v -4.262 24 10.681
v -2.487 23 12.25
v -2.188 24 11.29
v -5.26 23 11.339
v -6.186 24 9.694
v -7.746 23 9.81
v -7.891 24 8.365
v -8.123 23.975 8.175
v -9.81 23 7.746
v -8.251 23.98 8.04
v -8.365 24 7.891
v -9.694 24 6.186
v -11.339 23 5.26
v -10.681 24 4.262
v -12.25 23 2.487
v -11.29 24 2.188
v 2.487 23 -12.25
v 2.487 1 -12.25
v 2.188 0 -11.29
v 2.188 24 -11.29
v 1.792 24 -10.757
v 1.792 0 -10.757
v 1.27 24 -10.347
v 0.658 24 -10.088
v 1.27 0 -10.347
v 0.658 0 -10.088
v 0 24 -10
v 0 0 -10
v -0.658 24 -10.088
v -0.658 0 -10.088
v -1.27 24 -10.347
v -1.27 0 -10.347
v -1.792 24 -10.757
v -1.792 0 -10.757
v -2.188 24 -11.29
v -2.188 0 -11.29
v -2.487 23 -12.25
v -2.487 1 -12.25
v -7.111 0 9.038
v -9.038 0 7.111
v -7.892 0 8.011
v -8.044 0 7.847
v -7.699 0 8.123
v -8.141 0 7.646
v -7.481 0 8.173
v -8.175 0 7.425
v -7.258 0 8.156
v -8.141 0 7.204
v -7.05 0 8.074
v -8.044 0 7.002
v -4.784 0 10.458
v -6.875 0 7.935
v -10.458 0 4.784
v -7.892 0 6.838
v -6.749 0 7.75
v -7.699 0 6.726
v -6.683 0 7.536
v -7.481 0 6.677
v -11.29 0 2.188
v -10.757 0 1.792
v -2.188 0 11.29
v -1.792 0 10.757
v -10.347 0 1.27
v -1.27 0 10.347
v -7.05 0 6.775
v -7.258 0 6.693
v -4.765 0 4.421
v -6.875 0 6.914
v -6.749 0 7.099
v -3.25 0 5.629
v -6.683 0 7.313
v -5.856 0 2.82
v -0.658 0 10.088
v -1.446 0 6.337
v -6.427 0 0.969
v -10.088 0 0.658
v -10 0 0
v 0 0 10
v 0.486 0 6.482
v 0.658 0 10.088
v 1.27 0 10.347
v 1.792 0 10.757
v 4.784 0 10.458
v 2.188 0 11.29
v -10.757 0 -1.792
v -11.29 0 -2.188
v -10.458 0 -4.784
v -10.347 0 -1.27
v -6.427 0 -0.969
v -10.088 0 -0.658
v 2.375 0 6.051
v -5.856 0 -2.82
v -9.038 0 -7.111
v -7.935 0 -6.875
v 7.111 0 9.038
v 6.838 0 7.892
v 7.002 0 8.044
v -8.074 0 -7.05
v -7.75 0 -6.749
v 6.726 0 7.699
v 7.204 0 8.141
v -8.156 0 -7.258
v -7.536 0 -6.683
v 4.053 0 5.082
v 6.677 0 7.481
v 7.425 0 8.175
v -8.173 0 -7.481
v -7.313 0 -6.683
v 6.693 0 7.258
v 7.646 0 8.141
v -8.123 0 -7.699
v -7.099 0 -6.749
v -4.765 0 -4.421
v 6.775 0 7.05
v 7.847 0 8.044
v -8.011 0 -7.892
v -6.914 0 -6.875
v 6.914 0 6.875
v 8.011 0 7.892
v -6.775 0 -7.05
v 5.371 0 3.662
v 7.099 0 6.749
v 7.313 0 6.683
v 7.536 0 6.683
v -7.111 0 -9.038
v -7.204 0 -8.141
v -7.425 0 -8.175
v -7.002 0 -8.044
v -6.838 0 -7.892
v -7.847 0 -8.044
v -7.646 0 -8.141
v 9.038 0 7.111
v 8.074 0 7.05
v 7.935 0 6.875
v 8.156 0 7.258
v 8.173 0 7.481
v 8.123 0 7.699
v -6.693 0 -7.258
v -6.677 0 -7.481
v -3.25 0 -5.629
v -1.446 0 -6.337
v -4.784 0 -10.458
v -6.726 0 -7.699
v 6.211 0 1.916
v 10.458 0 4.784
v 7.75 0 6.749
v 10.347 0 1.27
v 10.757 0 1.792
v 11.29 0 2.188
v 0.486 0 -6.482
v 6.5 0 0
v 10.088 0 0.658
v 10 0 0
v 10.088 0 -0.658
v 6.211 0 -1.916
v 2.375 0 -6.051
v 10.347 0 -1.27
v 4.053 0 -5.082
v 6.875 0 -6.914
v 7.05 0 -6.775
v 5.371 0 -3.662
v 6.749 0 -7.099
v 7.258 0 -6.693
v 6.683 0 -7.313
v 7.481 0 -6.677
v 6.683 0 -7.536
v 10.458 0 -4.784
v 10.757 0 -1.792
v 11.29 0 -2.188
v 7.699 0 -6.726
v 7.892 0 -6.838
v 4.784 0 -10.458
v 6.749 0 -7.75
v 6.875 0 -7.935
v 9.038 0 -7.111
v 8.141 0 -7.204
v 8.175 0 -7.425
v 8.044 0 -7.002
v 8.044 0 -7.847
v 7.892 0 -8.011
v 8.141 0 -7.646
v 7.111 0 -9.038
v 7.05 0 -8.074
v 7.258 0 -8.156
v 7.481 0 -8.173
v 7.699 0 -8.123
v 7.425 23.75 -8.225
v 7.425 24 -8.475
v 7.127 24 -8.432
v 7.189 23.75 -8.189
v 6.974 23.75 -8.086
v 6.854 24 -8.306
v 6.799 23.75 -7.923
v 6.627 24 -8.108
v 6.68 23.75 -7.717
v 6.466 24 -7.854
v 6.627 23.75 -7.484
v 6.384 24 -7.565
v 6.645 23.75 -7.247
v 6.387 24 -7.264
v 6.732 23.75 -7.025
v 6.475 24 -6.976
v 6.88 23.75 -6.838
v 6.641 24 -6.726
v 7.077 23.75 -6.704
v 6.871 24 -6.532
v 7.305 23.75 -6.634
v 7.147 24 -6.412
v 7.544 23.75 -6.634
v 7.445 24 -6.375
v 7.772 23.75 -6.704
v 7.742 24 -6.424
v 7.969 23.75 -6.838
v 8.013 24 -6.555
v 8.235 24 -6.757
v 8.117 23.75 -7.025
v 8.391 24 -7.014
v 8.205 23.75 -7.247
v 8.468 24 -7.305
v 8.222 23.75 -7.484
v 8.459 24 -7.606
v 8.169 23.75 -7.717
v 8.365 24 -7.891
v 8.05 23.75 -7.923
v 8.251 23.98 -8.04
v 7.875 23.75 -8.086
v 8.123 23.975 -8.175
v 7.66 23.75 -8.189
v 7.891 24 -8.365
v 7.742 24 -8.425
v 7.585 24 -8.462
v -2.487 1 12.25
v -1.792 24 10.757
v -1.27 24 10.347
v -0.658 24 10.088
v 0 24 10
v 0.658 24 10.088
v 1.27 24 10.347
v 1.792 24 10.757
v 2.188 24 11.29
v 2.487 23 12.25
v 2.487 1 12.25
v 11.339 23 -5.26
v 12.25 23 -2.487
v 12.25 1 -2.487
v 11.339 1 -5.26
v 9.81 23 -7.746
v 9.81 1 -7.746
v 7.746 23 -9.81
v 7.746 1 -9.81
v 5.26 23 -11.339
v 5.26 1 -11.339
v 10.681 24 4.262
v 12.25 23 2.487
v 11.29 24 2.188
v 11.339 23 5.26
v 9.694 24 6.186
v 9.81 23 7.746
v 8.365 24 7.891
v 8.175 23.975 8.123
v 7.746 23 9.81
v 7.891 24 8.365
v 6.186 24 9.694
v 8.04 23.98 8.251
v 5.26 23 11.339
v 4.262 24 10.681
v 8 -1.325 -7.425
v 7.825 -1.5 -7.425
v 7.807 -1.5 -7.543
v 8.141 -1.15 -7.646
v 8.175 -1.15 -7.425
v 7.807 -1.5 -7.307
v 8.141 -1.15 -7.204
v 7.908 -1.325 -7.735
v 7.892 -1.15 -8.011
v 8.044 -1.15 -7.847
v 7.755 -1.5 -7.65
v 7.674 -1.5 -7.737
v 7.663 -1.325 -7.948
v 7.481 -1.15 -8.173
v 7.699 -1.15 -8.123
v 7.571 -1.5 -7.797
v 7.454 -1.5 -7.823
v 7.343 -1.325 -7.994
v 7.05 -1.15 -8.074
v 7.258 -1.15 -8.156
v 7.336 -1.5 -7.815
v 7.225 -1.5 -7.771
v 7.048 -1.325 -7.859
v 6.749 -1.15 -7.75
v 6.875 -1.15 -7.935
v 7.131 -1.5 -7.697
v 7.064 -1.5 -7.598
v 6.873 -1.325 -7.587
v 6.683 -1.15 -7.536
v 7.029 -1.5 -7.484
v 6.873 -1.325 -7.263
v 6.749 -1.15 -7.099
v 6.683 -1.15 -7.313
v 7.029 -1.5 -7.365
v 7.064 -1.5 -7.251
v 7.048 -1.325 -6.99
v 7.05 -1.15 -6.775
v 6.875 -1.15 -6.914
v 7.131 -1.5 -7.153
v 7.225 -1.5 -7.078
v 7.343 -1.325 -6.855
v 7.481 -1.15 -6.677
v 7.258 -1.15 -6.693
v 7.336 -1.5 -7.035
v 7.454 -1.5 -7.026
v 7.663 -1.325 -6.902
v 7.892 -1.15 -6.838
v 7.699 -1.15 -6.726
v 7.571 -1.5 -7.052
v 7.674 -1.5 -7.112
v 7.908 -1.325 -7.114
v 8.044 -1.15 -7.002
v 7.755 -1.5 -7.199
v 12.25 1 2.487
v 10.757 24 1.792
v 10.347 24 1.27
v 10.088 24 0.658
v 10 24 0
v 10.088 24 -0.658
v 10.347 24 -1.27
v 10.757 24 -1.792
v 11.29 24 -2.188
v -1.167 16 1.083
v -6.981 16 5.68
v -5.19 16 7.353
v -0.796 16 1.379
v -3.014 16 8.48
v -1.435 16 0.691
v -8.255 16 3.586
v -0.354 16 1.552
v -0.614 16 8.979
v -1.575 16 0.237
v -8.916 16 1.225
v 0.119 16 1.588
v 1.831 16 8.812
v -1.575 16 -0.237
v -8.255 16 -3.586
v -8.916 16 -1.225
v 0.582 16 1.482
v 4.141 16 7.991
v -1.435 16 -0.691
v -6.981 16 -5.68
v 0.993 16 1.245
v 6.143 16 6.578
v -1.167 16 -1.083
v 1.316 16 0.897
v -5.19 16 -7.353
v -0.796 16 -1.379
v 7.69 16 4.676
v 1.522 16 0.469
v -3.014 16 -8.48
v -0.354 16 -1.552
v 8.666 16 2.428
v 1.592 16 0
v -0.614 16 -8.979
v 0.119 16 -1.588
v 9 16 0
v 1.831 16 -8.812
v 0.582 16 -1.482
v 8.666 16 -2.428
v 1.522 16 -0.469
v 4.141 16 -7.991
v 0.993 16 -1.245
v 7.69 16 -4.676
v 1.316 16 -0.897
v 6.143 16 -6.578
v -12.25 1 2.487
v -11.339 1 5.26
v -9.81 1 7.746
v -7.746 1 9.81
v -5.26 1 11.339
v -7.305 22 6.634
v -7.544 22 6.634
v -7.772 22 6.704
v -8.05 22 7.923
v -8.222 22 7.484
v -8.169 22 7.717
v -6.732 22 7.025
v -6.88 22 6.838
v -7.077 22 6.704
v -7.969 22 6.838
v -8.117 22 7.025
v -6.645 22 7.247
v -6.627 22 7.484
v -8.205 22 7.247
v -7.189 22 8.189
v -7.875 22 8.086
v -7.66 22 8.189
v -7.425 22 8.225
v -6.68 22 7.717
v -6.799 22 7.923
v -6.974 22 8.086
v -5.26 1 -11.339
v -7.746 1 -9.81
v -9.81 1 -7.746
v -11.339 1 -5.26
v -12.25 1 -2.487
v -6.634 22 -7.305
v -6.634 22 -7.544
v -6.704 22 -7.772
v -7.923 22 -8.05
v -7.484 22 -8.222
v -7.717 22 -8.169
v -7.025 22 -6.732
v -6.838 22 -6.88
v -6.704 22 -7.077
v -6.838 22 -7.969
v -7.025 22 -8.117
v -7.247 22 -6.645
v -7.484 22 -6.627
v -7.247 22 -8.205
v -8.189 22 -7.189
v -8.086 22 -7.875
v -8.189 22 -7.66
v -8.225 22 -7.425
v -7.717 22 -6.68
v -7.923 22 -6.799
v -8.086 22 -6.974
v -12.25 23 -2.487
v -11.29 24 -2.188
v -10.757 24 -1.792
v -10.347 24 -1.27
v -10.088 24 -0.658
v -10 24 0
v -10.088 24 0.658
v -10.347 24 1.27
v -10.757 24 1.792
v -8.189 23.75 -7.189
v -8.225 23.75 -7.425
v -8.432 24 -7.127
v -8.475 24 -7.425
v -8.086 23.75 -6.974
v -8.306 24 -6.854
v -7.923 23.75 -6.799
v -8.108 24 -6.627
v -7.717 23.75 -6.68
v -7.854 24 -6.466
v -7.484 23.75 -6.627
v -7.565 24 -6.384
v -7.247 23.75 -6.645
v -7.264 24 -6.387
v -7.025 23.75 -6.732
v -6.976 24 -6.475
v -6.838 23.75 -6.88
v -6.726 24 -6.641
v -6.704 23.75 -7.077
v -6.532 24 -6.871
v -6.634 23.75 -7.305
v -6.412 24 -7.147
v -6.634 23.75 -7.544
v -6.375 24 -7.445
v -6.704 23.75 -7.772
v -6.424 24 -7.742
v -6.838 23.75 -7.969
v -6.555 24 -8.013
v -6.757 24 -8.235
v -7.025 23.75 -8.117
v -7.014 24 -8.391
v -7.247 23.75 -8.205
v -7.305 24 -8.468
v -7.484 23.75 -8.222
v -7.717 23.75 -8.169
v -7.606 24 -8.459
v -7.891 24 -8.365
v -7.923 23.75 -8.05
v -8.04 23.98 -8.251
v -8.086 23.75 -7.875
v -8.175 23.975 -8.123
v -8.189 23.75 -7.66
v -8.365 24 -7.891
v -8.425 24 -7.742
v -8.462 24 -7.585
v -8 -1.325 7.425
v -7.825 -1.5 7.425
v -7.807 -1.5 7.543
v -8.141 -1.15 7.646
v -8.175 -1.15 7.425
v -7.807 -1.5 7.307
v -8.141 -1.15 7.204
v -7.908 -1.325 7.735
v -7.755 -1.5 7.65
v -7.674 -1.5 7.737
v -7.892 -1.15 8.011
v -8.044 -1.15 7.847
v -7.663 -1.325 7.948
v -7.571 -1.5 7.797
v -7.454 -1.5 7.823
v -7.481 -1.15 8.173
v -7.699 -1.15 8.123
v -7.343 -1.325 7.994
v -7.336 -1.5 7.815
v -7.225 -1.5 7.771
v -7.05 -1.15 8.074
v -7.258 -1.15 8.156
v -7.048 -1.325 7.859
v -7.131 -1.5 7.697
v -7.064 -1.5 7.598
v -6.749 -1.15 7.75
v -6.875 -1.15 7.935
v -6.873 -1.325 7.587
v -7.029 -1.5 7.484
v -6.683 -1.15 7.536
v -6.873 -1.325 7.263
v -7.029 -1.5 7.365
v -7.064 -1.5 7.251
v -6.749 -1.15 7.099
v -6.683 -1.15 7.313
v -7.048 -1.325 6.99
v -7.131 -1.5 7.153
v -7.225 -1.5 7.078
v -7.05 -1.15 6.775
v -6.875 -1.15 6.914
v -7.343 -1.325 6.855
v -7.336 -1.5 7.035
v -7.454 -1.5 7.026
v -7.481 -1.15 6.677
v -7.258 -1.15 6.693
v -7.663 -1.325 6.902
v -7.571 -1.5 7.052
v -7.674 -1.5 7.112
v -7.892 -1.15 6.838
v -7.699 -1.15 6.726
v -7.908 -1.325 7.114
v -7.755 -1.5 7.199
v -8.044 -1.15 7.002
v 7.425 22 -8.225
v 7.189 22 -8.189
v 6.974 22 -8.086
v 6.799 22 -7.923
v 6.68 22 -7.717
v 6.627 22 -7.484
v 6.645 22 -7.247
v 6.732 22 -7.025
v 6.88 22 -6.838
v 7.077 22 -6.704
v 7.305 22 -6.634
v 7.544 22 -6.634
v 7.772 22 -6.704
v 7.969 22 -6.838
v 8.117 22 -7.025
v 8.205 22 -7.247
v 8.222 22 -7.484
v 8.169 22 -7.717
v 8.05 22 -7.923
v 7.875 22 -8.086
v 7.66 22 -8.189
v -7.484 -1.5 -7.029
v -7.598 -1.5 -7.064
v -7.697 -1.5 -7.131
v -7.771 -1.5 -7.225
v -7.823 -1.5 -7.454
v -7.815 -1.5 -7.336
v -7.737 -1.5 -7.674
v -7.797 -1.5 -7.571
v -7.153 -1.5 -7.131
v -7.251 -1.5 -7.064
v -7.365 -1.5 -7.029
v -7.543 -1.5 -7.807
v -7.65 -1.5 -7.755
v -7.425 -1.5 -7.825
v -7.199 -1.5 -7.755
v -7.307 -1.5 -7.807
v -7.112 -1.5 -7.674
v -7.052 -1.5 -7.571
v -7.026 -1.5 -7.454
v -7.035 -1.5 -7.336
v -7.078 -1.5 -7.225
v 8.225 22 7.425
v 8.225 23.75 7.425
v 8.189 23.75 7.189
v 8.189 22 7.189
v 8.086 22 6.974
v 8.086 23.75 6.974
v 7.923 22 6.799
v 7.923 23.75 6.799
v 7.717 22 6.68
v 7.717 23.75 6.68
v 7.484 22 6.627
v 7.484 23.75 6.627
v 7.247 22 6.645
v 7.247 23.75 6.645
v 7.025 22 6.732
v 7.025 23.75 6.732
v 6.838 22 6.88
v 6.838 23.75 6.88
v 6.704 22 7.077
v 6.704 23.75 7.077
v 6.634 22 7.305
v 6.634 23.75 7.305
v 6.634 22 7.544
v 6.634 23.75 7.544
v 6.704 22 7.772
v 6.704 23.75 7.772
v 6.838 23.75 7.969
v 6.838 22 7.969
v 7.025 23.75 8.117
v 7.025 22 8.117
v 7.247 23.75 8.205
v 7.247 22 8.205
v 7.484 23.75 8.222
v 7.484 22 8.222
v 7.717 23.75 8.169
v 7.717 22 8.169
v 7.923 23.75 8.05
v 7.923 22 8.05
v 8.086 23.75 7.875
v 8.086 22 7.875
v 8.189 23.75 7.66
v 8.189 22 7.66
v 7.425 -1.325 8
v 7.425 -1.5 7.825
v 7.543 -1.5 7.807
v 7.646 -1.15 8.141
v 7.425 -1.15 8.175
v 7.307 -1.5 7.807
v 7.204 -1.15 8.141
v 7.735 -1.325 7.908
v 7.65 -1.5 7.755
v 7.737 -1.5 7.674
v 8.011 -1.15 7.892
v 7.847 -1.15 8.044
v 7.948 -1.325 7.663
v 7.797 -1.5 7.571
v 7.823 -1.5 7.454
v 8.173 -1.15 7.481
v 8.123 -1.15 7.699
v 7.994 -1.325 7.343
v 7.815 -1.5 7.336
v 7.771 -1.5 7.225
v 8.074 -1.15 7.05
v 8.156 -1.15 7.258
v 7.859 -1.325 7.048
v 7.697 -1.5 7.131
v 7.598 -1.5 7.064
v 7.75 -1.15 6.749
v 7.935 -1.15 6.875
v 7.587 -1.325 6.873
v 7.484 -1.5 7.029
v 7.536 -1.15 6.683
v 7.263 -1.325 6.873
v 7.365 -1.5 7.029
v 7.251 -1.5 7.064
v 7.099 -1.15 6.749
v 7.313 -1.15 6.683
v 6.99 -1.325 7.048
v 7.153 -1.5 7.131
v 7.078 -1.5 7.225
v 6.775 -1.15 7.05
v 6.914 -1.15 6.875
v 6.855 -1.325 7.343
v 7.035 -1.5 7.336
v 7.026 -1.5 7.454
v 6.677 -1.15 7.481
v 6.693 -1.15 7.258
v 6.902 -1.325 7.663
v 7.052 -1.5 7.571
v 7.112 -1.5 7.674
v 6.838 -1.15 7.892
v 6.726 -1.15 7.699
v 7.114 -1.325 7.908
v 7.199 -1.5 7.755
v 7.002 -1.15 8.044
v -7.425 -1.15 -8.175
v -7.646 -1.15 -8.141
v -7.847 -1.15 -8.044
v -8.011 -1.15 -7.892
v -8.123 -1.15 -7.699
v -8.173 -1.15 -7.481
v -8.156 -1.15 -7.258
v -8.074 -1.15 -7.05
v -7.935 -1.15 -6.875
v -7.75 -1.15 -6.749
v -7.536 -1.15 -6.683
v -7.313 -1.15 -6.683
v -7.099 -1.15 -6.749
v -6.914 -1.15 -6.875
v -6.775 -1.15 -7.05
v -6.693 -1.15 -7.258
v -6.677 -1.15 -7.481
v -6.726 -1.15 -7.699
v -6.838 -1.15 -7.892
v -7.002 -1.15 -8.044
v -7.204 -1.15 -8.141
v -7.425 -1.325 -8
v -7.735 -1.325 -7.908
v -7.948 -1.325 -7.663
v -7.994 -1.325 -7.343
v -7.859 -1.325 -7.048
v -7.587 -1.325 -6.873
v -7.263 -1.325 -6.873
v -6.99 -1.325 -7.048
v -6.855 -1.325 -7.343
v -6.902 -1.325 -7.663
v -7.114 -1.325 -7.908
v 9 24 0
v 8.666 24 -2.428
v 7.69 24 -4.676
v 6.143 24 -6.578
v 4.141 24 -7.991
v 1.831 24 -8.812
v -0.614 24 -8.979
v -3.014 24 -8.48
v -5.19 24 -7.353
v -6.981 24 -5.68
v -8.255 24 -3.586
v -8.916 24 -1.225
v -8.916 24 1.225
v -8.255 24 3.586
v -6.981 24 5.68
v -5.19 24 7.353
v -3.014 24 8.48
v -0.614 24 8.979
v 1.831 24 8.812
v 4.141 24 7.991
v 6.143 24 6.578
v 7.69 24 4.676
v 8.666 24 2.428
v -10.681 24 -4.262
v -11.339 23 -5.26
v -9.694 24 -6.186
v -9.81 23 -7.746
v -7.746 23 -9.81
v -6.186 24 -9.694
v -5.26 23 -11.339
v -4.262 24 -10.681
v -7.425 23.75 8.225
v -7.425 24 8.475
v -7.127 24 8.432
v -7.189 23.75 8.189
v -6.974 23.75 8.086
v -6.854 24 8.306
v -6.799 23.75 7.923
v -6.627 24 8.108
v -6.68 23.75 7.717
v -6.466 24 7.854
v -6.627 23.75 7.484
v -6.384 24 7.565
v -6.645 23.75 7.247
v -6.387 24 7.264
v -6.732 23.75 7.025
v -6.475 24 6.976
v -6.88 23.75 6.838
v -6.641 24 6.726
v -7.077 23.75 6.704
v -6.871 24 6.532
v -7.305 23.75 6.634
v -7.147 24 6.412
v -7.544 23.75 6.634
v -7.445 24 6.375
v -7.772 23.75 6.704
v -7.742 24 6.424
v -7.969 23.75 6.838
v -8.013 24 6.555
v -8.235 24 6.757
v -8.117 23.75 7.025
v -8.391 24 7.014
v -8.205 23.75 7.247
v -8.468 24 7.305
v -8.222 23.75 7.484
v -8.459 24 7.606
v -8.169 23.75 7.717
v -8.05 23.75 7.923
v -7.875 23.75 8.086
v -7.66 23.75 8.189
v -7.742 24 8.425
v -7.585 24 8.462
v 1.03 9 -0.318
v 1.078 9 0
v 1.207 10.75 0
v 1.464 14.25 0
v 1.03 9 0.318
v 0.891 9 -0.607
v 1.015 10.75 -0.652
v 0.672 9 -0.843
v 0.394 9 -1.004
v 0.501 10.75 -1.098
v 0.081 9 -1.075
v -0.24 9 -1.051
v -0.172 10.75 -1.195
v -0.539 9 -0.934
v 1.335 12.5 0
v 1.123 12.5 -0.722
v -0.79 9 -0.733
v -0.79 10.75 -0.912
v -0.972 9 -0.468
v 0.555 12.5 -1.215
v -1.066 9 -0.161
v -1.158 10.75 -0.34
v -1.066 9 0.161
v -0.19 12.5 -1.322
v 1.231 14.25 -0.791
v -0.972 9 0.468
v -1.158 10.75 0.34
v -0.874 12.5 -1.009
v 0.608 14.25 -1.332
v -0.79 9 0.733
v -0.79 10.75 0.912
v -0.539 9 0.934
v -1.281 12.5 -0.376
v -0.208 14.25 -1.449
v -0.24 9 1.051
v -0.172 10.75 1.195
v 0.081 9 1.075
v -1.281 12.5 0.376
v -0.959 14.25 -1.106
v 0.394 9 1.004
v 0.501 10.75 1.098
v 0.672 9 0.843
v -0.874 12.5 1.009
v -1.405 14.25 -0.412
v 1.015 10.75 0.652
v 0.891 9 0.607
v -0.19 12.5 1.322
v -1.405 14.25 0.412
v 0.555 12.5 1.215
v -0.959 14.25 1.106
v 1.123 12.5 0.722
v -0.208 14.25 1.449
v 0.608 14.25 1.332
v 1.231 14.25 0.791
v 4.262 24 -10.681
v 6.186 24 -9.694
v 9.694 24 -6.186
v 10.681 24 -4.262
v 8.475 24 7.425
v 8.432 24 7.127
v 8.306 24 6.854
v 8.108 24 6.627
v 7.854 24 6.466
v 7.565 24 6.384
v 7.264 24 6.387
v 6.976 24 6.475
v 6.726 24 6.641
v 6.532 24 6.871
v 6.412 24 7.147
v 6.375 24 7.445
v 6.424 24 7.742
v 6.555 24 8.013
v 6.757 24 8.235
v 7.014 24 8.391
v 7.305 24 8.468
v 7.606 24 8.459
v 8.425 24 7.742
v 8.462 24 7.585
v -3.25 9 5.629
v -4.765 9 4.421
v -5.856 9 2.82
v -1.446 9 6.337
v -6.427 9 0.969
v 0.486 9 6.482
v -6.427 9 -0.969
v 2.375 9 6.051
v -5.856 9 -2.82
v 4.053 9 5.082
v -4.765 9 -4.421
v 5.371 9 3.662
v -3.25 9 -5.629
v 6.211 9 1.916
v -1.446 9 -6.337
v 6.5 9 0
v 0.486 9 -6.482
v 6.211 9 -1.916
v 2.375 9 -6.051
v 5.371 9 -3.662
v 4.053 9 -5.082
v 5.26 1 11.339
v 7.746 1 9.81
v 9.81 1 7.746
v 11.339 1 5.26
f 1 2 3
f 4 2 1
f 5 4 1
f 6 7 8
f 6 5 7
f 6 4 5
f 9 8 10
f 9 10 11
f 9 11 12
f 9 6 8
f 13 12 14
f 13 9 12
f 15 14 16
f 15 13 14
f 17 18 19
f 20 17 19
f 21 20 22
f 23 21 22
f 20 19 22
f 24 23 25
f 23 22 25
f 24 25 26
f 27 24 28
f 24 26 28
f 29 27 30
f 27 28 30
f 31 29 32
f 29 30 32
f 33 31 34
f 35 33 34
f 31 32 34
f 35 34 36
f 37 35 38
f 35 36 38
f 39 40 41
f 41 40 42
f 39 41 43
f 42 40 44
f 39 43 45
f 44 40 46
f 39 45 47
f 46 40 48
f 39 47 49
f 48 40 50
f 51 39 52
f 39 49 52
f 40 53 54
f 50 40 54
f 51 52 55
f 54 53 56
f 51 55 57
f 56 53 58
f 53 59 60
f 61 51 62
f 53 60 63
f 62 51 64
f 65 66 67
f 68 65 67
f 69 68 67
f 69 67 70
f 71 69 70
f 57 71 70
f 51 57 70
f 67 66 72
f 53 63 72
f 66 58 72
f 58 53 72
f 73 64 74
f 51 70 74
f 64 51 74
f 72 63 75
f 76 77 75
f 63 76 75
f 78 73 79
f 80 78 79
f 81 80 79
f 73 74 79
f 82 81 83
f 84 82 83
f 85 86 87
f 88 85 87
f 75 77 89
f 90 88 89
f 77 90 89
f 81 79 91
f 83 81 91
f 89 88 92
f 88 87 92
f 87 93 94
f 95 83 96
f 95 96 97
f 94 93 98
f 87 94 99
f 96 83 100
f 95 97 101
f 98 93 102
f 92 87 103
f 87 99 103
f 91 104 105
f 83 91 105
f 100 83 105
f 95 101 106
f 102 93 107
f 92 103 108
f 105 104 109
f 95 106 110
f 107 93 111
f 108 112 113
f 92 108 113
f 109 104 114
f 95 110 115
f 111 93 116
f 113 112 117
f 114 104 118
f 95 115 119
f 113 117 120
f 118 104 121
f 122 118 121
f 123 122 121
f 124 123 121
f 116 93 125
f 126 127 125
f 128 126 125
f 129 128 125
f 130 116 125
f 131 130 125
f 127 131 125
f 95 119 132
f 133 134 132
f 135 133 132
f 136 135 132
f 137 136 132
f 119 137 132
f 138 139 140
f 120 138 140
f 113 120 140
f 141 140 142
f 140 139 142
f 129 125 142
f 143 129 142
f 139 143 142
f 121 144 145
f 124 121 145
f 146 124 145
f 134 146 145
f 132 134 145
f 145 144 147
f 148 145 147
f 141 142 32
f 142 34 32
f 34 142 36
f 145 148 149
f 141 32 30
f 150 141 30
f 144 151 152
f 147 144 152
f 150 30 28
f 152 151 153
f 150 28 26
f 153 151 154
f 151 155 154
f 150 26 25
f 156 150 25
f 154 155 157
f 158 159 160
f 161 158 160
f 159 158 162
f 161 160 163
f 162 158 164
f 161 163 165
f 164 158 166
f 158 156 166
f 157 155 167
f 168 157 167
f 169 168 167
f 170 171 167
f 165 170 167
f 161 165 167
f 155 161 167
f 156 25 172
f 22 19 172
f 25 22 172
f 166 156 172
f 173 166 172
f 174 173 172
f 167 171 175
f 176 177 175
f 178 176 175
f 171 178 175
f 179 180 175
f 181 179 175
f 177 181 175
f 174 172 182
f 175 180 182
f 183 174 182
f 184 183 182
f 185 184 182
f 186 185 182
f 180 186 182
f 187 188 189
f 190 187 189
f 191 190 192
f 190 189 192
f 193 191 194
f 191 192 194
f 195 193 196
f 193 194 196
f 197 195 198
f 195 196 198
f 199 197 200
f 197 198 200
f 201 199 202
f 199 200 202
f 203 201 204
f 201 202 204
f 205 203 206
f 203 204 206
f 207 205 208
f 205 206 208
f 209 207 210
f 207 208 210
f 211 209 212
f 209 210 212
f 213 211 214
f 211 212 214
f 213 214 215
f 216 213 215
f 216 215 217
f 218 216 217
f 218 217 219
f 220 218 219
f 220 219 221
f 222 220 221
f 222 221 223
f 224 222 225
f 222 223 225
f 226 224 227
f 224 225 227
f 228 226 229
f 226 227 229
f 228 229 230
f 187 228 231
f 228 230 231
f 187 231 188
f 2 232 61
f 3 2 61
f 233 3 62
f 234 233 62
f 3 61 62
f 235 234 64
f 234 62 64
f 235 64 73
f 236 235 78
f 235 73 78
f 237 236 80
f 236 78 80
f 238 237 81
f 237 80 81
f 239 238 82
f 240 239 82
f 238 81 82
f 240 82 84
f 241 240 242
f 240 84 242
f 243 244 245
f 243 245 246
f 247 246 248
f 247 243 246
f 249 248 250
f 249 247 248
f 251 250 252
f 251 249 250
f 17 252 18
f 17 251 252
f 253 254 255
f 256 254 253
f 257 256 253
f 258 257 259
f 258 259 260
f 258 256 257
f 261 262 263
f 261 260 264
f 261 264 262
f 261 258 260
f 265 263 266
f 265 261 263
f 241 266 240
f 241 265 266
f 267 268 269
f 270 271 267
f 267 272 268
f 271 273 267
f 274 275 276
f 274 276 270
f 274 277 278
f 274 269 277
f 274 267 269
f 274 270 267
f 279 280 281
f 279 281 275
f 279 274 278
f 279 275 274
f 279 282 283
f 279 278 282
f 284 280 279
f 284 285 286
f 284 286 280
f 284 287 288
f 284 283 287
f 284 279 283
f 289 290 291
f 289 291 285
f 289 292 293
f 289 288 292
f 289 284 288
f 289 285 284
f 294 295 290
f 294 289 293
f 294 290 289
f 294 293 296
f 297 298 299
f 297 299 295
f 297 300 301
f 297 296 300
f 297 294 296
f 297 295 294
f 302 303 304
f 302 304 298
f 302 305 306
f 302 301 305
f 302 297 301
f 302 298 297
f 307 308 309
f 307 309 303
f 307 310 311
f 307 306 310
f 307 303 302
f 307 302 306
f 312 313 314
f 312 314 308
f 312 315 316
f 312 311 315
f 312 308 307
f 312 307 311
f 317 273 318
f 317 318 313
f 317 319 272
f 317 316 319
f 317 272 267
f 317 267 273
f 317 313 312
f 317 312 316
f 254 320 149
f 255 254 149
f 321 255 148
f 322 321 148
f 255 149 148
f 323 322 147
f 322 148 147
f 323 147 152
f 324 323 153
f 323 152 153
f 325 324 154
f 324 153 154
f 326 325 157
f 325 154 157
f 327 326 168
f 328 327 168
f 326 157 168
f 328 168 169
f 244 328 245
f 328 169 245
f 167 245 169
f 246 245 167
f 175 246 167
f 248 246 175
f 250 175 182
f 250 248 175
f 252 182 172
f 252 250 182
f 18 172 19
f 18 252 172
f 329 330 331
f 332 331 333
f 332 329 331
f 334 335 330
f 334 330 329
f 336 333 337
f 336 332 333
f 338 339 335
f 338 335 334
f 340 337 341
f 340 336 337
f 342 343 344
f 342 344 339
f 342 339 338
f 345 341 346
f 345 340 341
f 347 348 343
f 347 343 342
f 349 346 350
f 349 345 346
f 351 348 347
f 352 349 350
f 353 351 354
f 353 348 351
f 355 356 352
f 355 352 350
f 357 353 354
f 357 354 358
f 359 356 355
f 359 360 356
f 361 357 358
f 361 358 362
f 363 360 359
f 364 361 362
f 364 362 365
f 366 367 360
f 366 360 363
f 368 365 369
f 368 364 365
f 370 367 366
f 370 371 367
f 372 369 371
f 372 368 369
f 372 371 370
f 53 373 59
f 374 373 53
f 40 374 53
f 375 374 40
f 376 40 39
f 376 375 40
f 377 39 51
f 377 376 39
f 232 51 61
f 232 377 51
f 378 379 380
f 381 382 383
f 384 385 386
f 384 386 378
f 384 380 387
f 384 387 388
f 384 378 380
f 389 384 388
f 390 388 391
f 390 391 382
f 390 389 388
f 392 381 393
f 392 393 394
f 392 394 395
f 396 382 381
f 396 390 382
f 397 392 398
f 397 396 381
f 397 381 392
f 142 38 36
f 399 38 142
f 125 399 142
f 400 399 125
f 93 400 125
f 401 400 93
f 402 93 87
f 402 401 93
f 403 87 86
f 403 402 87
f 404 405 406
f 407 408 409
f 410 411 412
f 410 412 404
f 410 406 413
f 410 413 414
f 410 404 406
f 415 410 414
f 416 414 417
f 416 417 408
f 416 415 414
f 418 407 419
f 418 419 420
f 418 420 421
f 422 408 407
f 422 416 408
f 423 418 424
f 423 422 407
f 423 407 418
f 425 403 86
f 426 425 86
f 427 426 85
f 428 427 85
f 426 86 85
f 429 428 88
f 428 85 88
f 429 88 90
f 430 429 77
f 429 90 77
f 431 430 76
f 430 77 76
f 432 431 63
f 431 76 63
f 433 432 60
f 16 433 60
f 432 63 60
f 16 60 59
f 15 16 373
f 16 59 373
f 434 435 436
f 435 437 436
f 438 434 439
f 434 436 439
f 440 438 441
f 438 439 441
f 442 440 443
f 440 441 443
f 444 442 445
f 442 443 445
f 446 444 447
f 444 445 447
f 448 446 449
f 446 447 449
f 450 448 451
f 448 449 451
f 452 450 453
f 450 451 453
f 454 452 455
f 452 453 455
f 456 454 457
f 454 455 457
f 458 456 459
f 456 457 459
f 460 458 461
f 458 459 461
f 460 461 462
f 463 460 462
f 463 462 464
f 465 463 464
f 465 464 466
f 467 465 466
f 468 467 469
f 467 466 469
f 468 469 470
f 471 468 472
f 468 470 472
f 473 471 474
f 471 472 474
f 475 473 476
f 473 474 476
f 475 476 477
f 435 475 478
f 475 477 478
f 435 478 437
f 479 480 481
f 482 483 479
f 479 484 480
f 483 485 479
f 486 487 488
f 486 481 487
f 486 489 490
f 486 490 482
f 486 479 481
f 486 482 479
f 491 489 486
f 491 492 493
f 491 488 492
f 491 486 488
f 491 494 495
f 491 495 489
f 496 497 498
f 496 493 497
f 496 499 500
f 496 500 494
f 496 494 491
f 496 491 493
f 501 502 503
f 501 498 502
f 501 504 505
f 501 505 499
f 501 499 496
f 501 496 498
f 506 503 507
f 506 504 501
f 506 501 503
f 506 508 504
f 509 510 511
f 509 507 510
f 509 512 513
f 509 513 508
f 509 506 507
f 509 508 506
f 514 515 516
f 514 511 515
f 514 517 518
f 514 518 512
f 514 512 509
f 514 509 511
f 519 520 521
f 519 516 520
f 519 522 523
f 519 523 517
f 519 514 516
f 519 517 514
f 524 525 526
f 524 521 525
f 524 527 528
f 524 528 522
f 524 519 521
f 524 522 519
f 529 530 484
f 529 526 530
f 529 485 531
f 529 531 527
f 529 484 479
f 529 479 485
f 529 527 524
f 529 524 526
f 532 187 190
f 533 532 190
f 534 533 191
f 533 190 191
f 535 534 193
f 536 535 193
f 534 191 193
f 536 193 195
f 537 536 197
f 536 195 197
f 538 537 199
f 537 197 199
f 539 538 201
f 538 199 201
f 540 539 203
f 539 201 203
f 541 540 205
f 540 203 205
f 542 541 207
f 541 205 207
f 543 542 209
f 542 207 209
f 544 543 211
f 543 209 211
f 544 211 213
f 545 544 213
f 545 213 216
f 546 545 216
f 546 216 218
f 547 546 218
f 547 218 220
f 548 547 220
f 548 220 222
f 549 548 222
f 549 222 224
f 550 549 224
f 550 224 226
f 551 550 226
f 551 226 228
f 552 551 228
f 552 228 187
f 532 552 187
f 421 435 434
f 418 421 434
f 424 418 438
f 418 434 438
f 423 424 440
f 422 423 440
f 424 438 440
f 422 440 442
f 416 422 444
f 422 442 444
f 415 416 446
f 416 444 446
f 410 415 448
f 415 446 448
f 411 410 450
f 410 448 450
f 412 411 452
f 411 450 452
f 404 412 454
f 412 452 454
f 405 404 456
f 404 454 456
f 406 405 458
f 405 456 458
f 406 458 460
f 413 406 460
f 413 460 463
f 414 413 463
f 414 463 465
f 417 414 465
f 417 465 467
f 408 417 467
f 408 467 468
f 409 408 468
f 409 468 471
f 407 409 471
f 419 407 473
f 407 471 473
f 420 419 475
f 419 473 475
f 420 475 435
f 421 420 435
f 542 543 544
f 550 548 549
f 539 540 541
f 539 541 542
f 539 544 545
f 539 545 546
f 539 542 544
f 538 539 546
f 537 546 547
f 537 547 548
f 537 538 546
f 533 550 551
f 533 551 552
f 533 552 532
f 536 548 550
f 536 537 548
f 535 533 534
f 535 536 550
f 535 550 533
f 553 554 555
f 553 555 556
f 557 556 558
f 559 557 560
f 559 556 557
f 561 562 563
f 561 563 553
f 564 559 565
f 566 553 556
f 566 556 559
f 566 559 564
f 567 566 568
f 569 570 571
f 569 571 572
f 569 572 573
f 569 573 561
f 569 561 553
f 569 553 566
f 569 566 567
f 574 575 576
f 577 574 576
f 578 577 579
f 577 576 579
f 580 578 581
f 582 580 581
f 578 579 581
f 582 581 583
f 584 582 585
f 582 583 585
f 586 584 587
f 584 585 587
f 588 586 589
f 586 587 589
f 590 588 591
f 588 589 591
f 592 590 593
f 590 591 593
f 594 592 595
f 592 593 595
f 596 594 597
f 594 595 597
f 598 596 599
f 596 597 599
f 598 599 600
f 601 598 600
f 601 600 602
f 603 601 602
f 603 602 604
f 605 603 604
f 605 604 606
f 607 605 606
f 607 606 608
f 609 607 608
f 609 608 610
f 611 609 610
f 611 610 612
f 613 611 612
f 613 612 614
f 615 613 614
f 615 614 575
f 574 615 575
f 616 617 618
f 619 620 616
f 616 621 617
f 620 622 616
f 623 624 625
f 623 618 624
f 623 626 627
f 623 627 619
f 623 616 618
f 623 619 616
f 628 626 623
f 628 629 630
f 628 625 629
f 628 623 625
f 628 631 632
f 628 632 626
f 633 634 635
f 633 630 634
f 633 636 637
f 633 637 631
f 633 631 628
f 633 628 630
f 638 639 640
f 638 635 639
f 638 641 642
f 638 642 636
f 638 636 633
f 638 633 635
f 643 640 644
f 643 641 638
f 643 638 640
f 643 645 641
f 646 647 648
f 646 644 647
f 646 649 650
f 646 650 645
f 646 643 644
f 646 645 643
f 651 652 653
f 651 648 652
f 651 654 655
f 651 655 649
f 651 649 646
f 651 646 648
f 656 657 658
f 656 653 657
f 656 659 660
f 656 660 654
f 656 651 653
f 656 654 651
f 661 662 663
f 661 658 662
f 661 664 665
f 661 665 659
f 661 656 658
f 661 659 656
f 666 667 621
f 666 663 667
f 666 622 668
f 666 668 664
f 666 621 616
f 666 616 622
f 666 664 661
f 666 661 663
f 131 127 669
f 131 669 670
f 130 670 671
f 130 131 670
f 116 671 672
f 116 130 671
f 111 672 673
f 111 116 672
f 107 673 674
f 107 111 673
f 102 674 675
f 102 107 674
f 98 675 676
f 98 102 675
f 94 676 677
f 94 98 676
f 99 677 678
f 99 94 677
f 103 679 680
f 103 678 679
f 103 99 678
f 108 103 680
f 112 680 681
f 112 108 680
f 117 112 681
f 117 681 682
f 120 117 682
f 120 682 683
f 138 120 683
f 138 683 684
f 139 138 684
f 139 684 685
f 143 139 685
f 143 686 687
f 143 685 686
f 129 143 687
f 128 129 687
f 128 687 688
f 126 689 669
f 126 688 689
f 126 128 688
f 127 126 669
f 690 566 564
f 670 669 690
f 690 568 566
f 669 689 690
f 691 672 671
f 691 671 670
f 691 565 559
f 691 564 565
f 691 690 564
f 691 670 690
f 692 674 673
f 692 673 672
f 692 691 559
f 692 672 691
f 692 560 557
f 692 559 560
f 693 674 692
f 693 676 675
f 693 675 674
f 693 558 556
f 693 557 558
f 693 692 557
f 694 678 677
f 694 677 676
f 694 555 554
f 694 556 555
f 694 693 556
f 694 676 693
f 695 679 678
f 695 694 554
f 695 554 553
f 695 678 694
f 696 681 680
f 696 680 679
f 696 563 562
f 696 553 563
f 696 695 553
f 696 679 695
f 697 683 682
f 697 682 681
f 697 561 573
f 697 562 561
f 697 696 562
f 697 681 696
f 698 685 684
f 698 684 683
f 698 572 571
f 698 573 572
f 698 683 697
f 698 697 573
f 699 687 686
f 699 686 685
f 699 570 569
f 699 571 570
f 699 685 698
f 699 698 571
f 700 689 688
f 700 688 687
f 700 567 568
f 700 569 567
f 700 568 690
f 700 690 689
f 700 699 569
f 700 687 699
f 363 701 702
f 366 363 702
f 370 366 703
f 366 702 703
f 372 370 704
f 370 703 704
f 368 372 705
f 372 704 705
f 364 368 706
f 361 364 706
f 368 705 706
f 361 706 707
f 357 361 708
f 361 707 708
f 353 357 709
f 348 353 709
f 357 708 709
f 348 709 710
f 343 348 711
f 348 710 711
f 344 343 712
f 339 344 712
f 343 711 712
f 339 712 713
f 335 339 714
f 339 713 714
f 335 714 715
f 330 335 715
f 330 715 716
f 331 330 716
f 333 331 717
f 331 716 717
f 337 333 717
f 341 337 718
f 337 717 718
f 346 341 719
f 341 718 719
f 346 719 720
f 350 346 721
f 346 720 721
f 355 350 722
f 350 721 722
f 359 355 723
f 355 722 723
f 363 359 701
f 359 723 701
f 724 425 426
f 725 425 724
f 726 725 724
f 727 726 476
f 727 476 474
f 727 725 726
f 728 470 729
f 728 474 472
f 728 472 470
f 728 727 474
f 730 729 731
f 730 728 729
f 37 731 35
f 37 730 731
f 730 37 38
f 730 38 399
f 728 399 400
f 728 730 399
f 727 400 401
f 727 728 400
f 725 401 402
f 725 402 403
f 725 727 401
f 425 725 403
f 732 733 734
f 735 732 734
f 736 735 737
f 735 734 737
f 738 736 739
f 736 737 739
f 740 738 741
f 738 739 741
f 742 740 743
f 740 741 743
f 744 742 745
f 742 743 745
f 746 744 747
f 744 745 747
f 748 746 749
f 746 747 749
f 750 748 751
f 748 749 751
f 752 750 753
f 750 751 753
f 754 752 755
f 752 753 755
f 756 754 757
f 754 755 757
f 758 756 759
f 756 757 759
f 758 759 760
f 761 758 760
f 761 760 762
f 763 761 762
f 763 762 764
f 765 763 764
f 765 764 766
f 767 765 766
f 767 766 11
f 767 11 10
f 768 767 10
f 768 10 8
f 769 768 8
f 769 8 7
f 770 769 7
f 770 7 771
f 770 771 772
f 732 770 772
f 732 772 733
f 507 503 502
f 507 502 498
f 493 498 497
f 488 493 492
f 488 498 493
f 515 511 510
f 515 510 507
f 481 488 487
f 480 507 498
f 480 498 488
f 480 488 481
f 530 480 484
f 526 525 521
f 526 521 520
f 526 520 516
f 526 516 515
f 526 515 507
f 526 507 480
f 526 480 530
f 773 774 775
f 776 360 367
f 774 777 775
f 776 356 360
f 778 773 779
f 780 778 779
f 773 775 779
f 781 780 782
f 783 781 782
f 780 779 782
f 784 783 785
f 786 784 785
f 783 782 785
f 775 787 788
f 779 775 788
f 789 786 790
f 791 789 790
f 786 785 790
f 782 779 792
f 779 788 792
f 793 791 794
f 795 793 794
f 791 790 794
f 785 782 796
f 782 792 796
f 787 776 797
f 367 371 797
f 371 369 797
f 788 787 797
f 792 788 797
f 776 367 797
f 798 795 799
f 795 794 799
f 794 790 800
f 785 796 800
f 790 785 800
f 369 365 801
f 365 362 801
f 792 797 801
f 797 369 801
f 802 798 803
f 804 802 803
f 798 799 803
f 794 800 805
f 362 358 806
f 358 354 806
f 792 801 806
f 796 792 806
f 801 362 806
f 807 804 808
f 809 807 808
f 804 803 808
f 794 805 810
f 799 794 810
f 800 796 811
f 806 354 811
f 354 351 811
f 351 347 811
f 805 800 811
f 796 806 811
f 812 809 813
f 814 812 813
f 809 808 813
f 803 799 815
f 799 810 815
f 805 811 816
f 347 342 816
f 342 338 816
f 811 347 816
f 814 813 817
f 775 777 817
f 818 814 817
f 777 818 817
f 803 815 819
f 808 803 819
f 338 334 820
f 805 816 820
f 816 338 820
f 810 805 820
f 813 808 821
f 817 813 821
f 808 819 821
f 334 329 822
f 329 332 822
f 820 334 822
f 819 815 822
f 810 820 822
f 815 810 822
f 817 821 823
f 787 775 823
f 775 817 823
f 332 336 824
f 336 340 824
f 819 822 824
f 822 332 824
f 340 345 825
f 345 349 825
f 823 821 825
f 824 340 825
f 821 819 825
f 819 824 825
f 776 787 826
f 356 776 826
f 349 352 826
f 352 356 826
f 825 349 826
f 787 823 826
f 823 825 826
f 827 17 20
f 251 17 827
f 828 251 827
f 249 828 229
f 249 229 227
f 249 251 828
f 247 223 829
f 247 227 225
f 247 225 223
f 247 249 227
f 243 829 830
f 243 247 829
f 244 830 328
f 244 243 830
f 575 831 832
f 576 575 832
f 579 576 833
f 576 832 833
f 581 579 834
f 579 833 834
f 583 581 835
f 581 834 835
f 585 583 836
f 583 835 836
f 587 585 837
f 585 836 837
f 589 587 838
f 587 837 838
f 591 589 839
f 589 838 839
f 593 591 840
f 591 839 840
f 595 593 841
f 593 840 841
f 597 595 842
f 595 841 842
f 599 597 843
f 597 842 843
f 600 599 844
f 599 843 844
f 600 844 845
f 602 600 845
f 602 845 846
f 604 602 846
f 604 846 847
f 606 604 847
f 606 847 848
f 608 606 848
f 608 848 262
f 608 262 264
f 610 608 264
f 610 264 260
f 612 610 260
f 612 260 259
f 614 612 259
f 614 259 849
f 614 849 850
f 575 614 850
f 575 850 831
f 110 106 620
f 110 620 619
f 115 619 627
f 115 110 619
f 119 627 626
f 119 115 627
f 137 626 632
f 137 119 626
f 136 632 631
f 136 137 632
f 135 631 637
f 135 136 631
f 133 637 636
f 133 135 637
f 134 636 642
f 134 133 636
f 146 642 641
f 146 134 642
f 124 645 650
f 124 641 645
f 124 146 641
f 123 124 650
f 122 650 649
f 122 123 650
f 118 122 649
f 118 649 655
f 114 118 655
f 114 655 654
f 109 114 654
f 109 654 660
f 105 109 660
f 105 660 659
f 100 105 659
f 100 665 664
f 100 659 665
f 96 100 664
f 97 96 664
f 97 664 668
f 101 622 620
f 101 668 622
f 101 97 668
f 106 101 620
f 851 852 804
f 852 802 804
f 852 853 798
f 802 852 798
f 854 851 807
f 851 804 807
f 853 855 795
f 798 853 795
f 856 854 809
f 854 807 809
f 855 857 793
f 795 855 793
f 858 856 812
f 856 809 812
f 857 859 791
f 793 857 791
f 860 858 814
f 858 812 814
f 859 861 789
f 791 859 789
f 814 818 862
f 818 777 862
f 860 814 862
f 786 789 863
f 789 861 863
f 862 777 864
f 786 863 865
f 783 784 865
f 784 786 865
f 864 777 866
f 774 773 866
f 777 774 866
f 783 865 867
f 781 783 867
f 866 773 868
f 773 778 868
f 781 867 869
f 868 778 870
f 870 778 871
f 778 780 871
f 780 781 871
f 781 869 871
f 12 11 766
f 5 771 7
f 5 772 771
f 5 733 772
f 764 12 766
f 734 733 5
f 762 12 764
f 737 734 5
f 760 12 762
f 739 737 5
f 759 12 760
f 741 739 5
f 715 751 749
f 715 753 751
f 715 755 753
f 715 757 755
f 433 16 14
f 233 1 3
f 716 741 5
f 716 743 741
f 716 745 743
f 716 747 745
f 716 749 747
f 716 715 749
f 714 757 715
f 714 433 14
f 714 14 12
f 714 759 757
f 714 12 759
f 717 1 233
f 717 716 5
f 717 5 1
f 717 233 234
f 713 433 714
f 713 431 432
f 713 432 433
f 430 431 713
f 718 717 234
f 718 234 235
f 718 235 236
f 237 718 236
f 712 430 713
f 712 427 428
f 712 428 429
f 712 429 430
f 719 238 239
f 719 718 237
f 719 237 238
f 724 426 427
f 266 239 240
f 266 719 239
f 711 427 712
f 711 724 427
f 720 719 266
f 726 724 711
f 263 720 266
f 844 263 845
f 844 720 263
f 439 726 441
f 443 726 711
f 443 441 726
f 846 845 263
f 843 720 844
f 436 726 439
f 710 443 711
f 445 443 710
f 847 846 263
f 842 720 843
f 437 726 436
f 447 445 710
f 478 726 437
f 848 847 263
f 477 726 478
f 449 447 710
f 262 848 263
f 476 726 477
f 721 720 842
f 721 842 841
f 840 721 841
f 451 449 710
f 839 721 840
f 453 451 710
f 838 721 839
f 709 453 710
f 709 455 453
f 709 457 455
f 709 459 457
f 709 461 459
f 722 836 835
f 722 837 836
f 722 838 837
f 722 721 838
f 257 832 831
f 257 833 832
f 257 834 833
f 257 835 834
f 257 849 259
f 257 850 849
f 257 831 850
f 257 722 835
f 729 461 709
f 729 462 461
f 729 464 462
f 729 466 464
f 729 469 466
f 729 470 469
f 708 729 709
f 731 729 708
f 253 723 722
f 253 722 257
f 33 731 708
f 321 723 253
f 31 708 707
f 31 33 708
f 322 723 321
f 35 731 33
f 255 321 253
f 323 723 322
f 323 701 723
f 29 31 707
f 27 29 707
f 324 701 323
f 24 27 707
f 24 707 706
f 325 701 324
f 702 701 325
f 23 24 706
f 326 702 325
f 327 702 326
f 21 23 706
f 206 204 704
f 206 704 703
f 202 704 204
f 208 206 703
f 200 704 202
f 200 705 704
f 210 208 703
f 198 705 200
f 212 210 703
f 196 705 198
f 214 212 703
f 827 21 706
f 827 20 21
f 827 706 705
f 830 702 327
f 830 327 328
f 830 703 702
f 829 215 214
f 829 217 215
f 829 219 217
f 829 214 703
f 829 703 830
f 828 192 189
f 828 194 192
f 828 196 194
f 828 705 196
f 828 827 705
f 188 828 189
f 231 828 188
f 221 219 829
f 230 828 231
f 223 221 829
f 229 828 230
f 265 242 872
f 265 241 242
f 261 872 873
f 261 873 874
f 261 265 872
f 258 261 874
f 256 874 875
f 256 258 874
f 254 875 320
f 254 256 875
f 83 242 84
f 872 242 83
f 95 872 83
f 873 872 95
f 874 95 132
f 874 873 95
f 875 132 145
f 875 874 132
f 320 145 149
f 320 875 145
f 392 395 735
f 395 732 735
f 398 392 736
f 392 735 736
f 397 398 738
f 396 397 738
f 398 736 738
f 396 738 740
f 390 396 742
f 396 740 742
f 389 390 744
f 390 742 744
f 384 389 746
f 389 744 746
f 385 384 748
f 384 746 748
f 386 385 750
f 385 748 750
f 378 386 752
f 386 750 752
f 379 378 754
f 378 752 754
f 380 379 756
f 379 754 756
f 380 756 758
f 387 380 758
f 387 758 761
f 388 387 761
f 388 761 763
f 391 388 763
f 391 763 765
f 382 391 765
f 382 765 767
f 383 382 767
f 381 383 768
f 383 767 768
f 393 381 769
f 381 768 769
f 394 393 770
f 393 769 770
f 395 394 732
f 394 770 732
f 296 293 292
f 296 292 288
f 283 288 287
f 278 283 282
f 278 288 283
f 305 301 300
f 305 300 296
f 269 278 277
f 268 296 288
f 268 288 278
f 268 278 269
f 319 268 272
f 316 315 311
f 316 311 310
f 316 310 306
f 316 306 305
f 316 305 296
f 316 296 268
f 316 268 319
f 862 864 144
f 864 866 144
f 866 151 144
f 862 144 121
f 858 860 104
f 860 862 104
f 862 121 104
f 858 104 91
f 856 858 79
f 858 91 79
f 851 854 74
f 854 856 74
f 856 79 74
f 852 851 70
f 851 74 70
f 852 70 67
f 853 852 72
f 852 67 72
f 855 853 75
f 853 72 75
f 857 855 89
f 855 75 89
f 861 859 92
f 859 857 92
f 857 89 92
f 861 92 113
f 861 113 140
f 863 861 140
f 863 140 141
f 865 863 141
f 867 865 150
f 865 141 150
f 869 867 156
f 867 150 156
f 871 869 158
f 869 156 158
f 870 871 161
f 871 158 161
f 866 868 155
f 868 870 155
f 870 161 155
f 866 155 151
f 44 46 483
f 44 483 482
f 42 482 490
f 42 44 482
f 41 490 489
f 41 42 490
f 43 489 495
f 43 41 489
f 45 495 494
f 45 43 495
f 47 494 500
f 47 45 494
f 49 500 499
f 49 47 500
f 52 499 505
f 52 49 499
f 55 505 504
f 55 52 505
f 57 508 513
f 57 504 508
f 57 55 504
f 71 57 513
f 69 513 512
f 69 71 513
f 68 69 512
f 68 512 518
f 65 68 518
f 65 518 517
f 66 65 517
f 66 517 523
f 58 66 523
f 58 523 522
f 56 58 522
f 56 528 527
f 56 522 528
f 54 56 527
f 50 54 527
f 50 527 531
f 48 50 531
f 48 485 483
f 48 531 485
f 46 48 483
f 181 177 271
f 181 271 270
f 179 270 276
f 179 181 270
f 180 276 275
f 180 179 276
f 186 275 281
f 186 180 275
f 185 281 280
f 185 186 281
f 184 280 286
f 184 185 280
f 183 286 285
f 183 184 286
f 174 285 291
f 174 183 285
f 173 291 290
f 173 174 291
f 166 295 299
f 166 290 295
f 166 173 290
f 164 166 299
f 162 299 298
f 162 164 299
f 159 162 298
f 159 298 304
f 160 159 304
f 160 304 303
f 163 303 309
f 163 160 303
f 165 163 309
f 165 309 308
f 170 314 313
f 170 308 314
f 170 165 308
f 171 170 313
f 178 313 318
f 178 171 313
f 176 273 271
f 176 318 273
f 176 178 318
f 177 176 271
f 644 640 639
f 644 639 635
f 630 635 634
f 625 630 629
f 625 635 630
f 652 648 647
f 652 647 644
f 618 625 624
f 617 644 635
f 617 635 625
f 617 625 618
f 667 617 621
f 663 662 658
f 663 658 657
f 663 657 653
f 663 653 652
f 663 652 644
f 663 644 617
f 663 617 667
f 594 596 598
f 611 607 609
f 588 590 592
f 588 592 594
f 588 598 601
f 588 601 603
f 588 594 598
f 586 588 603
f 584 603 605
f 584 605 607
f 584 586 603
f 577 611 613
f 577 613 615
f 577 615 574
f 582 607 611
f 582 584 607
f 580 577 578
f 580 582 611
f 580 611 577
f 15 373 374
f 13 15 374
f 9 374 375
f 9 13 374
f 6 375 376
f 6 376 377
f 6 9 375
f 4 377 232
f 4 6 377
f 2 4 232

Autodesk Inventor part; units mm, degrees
ref_plane "YZ Plane" through (0, 0, 0) normal (1, 0, 0) x (0, 1, 0)
ref_plane "XZ Plane" through (0, 0, 0) normal (0, 1, 0) x (-1, 0, 0)
ref_plane "XY Plane" through (0, 0, 0) normal (0, 0, 1) x (1, 0, 0)
sketch "Sketch1" plane through (0, 0, 0) normal (0, 0, 1) x (1, 0, 0)
  line L0 (0, 0) -> (0, 19.4488) construction
  line L1 (0, 0) -> (15.8946, 0) construction
  line L2 (1.0783, 9) -> (1.5923, 16)
  line L3 (1.0783, 9) -> (6.5, 9)
  line L4 (6.5, 9) -> (6.5, 0)
  line L5 (6.5, 0) -> (12.5, 0)
  line L6 (12.5, 0) -> (12.5, 24)
  line L7 (1.5923, 16) -> (9, 16)
  line L8 (9, 16) -> (9, 24)
  line L9 (9, 24) -> (12.5, 24)
  line L10 (1.0783, 9) -> (1.0049, 8) construction
  line L11 (1.0049, 8) -> (0.7849, 8) construction
  line L12 (1.5923, 16) -> (2.5, 28.36) construction
  line L13 (2.5, 28.36) -> (1.5, 28.36) construction
  line L14 (0.7849, 8) -> (0.4645, 1) construction
  line L15 (0.4645, 1) -> (0.2, 1) construction
  line L16 (0.2, 1) -> (1.5, 28.36) construction
  line L17 (0, 6.7) -> (1.1563, 6.7) construction
  line L18 (0.4708, 6.7) -> (0.4708, 8.6077) construction
  dimension "d1" = 12.5
  dimension "d2" = 6.5
  dimension "d7" = 9
  dimension "d8" = 9
  dimension "d45" = 24
  dimension "d46" = 8
  dimension "d47" = 4.2
  dimension "d49" = 20.36
  dimension "d50" = 2.5
  dimension "d51" = 2.62
  dimension "d53" = 0.22
  dimension "d54" = 7
  dimension "d55" = 0.2
  dimension "d56" = 1
  dimension "d57" = 5.7
  dimension "d58" = 2.3
revolve "Revolution1" add sketch "Sketch1" angle 360 about axis through (0, 0, 0) along (0, 1, 0)
chamfer "Chamfer2" distance 1 angle 45 2 edges at (-12.5, 0, 0) (-12.5, 24, 0)
sketch "Sketch2" plane through (0, 0, 0) normal (0, -1, 0) x (1, 0, 0)
  circle A0 centre (0, 0) radius 1.0783 construction
  circle A1 centre (0, 0) radius 10.5 construction
  circle A2 centre (0, 0) radius 1.5923 construction
  line L0 (0, 0) -> (19.4803, 0) construction
  line L1 (0, 0) -> (20.4554, -20.4554) construction
  circle A3 centre (7.4246, -7.4246) radius 0.75
  circle A4 centre (0, 0) radius 12.5
  circle A5 centre (12.5, 0) radius 2.5
  point P0 (12.25, 2.4875)
  point P1 (12.25, -2.4875)
  dimension "d19" = 21
  dimension "d23" = 25
  dimension "d20" = 45
  dimension "d21" = 1.5
  dimension "d22" = 5
extrude "Extrusion1" cut sketch "Sketch2" against normal through all contours A4 A5 picked at (11.6823, -0.4803)
extrude "Extrusion2" add sketch "Sketch2" along normal blind 1.5 contours A3
chamfer "Chamfer3" distance 0.35 angle 45 1 edges at (6.6746, -1.5, -7.4246)
pattern_circular "Circular Pattern1" count 4 over 360 about axis through (0, -10, 0) along (0, 1, 0) of "Extrusion1", "Extrusion2", "Chamfer3"
sketch "Sketch3" plane through (12.5, 24, 0) normal (0, 1, 0) x (1, 0, 0)
  circle A0 centre (-12.5, 0) radius 1.0783 construction
  line L0 (-12.5, 0) -> (0.4785, 0) construction
  line L1 (-12.5, 0) -> (-1.2806, -11.2194) construction
  circle A1 centre (-12.5, 0) radius 10.5 construction
  circle A2 centre (-5.0754, -7.4246) radius 0.8
  dimension "d34" = 21
  dimension "d35" = 45
  dimension "d36" = 1.6
extrude "Extrusion3" cut sketch "Sketch3" against normal blind 2
chamfer "Chamfer4" distance 0.25 angle 45 1 edges at (6.6246, 24, 7.4246)
pattern_circular "Circular Pattern2" count 4 over 360 about axis through (0, -10, 0) along (0, 1, 0) of "Extrusion3", "Chamfer4"
equation "\"d57\" = cutpipette_length"
equation "\"cutpipette_length\" = 5.7"
properties part number "cpd_lowrcf_0.7_p3_v1"
